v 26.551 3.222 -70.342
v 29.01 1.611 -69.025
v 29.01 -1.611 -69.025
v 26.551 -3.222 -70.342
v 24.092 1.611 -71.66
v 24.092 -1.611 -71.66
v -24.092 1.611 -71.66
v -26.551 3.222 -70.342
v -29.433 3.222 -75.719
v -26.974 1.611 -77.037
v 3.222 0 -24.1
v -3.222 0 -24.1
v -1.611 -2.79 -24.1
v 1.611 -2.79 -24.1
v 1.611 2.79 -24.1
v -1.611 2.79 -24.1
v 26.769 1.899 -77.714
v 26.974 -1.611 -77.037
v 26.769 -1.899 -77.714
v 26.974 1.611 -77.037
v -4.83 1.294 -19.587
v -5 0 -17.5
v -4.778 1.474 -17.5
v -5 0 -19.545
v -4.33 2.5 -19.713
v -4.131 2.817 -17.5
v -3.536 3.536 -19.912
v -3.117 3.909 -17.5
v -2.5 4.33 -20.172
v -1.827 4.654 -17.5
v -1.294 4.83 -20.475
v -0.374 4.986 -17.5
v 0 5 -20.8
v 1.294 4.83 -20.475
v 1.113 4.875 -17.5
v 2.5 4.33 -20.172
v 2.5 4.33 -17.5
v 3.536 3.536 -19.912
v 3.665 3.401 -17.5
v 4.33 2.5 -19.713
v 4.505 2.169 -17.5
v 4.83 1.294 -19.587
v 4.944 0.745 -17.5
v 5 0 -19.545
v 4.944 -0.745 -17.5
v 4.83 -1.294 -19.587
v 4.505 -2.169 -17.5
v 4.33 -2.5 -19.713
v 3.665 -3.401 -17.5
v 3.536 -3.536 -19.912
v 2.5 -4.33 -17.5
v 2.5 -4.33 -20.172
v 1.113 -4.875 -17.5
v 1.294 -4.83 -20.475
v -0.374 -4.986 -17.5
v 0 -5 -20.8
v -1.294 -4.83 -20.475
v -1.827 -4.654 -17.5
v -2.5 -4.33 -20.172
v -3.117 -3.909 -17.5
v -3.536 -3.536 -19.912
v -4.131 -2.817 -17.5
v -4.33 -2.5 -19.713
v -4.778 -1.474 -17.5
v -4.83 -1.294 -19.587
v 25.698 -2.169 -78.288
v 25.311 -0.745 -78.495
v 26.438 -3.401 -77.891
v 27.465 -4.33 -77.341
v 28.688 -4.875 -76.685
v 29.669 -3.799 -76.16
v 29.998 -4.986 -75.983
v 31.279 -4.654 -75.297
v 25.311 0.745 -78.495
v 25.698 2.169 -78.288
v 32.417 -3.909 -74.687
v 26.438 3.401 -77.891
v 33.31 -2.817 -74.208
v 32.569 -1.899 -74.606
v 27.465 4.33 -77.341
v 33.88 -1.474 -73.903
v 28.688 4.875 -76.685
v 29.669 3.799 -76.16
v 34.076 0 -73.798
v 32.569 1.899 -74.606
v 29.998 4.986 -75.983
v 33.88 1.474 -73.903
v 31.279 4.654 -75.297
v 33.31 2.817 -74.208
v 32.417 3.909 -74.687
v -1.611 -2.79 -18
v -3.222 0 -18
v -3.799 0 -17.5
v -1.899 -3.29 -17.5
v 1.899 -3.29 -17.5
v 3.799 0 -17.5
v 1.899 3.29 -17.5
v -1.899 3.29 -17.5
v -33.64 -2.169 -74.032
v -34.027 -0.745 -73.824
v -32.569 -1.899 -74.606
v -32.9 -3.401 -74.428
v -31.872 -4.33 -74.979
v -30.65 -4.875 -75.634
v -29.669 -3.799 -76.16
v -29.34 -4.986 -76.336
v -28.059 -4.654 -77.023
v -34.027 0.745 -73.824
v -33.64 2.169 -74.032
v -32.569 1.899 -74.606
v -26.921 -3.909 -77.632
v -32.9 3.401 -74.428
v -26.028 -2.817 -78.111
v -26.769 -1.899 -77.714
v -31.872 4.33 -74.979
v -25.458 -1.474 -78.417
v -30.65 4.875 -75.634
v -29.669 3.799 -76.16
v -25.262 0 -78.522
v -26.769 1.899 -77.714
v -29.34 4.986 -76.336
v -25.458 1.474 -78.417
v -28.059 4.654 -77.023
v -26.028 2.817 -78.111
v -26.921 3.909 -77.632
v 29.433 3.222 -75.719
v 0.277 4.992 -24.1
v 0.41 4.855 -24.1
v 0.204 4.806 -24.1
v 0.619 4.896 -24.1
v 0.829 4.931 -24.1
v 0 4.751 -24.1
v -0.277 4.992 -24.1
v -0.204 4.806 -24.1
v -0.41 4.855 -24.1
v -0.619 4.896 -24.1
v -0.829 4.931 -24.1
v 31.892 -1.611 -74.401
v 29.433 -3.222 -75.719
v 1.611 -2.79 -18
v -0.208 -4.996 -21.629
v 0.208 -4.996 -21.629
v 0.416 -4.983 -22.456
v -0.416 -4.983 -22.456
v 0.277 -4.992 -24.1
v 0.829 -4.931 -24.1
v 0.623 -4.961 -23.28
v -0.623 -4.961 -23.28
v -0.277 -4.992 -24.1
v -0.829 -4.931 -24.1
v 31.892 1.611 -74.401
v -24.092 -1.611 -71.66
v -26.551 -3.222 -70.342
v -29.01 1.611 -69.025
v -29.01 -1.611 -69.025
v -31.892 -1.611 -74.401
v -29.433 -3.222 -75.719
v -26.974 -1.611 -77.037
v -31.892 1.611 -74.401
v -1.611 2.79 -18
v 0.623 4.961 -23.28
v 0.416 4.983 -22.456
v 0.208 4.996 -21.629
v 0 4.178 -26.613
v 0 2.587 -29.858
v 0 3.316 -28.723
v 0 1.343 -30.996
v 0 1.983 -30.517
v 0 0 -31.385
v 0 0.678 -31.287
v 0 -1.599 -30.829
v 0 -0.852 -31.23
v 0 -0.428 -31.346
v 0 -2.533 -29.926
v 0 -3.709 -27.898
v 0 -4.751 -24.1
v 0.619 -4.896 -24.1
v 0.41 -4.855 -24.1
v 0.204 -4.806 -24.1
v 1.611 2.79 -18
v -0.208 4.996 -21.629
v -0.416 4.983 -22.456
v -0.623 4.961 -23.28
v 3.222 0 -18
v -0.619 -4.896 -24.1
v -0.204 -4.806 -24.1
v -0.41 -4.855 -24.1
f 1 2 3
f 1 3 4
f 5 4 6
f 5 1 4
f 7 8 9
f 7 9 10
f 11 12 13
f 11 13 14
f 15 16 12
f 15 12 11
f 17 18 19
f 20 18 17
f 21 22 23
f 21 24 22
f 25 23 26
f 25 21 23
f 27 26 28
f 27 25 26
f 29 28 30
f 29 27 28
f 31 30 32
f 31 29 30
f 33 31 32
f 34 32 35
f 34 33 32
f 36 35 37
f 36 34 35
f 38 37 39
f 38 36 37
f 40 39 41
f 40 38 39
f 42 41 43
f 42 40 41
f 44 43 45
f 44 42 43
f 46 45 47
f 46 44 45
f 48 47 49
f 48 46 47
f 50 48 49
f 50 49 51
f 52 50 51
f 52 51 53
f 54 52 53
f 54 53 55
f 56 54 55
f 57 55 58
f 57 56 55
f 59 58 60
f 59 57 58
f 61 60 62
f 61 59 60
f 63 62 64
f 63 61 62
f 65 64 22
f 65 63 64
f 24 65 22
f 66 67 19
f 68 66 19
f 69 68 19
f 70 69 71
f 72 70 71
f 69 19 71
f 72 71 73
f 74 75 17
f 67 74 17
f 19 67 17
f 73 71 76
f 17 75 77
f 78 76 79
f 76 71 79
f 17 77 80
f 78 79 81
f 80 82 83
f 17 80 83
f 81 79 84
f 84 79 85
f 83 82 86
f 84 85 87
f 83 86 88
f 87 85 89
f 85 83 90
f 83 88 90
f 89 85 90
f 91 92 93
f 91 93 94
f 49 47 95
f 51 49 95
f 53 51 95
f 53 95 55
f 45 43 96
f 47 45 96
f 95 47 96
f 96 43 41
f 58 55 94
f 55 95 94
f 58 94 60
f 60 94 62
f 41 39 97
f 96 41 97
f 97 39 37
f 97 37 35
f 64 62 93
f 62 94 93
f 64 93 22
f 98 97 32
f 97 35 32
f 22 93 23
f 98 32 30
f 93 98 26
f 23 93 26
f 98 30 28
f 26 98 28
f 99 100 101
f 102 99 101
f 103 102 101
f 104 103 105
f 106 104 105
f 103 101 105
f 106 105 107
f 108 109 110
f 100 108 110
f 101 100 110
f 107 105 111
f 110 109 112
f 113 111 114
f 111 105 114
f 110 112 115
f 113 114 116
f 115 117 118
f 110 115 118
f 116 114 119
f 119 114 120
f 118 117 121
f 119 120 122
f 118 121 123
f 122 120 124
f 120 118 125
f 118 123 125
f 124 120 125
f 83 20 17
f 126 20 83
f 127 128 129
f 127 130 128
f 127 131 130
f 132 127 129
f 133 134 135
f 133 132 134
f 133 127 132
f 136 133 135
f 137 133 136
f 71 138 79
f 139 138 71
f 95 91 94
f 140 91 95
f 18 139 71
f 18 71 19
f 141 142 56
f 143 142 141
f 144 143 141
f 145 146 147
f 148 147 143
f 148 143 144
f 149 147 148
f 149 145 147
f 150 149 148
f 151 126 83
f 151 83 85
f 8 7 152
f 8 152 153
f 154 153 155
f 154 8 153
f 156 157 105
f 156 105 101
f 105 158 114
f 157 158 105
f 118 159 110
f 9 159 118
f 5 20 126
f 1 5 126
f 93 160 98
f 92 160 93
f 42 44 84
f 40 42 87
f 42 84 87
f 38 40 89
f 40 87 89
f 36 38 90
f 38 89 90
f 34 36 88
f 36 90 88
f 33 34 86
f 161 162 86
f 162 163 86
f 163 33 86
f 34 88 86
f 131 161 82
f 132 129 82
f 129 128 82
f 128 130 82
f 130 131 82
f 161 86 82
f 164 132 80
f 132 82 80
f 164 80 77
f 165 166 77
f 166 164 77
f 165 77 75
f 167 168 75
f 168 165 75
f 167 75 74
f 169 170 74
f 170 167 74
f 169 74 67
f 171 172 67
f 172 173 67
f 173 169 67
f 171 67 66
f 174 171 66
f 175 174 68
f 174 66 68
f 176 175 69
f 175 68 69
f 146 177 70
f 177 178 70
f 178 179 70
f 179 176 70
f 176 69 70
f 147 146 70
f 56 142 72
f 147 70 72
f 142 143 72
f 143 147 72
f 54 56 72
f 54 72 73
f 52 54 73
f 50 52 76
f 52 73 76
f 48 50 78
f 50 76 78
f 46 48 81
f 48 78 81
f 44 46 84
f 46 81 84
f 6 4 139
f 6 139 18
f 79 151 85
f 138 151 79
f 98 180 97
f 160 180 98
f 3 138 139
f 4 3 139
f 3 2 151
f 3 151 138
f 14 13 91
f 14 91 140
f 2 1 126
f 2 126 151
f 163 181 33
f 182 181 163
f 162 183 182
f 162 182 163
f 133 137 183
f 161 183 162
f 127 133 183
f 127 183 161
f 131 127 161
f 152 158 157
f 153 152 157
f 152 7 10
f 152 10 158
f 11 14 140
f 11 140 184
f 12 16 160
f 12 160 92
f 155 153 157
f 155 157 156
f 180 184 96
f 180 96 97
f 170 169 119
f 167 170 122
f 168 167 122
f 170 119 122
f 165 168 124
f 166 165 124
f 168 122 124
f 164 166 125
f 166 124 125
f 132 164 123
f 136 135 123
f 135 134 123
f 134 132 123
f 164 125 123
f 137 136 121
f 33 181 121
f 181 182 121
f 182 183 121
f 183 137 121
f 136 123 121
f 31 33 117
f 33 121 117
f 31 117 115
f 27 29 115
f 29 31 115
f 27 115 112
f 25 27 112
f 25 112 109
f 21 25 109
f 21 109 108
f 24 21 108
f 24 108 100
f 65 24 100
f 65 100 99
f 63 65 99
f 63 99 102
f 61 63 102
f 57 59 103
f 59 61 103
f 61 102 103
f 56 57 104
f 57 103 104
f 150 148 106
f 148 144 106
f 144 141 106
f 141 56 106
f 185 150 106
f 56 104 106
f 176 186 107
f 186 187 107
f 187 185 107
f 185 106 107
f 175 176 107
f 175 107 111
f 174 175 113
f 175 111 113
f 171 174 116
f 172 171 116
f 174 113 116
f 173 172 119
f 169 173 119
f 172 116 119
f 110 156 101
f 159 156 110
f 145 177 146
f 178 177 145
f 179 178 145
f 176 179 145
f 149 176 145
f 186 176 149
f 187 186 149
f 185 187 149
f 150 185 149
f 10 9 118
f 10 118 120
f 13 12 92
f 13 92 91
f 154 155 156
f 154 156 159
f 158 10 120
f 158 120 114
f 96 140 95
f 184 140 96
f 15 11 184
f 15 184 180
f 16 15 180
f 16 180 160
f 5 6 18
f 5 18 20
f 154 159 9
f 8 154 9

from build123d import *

# Parameters (mm, degrees)
SKETCH1_W           = 5
SKETCH1_H           = 6.6
BOSS_EXTRUDE1_REACH = 70.079
SKETCH3_R           = 5
BOSS_EXTRUDE2_REACH = 83.814
SKETCH4_R           = 5
CUT_EXTRUDE1_DEPTH  = 6.6
CUT_EXTRUDE2_DEPTH  = 6.6
CUT_EXTRUDE3_DEPTH  = 6.6
CHAMFER1_SIZE       = 0.5


with BuildPart() as part:
    # Sketch1 → Revolve-Thin2 (revolve)
    with BuildSketch(Plane(origin=(0, 0, 0), x_dir=(1, 0, 0), z_dir=(0, 1, 0))):
        with Locations((-2.5, 20.8)):
            Rectangle(SKETCH1_W, SKETCH1_H)
    revolve(axis=Axis((0, 0, -17.5), (0, 0, -1)))

    # Sketch3 → Boss-Extrude1 (add, up to next)
    with BuildSketch(Plane(origin=(-38.328954944, 0, -71.518501264), x_dir=(0.881400586, 0, -0.472369565), z_dir=(0.472369565, 0, 0.881400586)), mode=Mode.PRIVATE) as boss_extrude1_sk1:
        with Locations((9.825286961, 0)):
            Circle(SKETCH3_R)
    boss_extrude1_tool1 = extrude(boss_extrude1_sk1.sketch, amount=BOSS_EXTRUDE1_REACH, mode=Mode.PRIVATE) - part.part
    add(boss_extrude1_tool1.solids().sort_by_distance((-29.668941, 0, -76.159668))[0])

    # Sketch4 → Boss-Extrude2 (add, up to next)
    with BuildSketch(Plane(origin=(38.328954944, 0, -71.518501264), x_dir=(0.881400586, 0, 0.472369565), z_dir=(-0.472369565, 0, 0.881400586)), mode=Mode.PRIVATE) as boss_extrude2_sk1:
        with Locations((-9.825286961, 0)):
            Circle(SKETCH4_R)
    boss_extrude2_tool1 = extrude(boss_extrude2_sk1.sketch, amount=BOSS_EXTRUDE2_REACH, mode=Mode.PRIVATE) - part.part
    add(boss_extrude2_tool1.solids().sort_by_distance((29.668941, 0, -76.159668))[0])

    # Sketch5 → Cut-Extrude1 (cut)
    with BuildSketch(Plane.XY.offset(-17.5)):
        Polygon((1.610807251, 2.79), (-1.610807251, 2.79), (-3.221614502, 0), (-1.610807251, -2.79), (1.610807251, -2.79), (3.221614502, 0), align=None)
    extrude(amount=-CUT_EXTRUDE1_DEPTH, mode=Mode.SUBTRACT)

    # Sketch7 → Cut-Extrude2 (cut)
    with BuildSketch(Plane(origin=(-38.328954944, 0, -71.518501264), x_dir=(-0.881400586, 0, 0.472369565), z_dir=(-0.472369565, 0, -0.881400586))):
        Polygon((-7.035286961, 1.610807251), (-9.825286961, 3.221614502), (-12.615286961, 1.610807251), (-12.615286961, -1.610807251), (-9.825286961, -3.221614502), (-7.035286961, -1.610807251), align=None)
    extrude(amount=-CUT_EXTRUDE2_DEPTH, mode=Mode.SUBTRACT)

    # Sketch8 → Cut-Extrude3 (cut)
    with BuildSketch(Plane(origin=(38.328954944, 0, -71.518501264), x_dir=(-0.881400586, 0, -0.472369565), z_dir=(0.472369565, 0, -0.881400586))):
        Polygon((12.615286961, 1.610807251), (9.825286961, 3.221614502), (7.035286961, 1.610807251), (7.035286961, -1.610807251), (9.825286961, -3.221614502), (12.615286961, -1.610807251), align=None)
    extrude(amount=-CUT_EXTRUDE3_DEPTH, mode=Mode.SUBTRACT)

    # Chamfer1
    chamfer1_edges = [part.edges().sort_by_distance(p)[0] for p in [
        (2.416210877, 1.395, -17.5),
        (0, 2.79, -17.5),
        (-2.416210877, 1.395, -17.5),
        (-2.416210877, -1.395, -17.5),
        (0, -2.79, -17.5),
        (2.416210877, -1.395, -17.5),
        (-32.128048891, 0, -74.841756709),
        (-30.898495073, 2.416210877, -75.500712253),
        (-28.439387437, 2.416210877, -76.81862334),
        (-27.209833619, 0, -77.477578884),
        (-28.439387437, -2.416210877, -76.81862334),
        (-30.898495073, -2.416210877, -75.500712253),
        (27.209833619, 0, -77.477578884),
        (28.439387437, 2.416210877, -76.81862334),
        (30.898495073, 2.416210877, -75.500712253),
        (32.128048891, 0, -74.841756709),
        (30.898495073, -2.416210877, -75.500712253),
        (28.439387437, -2.416210877, -76.81862334),
    ]]
    chamfer(chamfer1_edges, length=CHAMFER1_SIZE)


solid = part.part
